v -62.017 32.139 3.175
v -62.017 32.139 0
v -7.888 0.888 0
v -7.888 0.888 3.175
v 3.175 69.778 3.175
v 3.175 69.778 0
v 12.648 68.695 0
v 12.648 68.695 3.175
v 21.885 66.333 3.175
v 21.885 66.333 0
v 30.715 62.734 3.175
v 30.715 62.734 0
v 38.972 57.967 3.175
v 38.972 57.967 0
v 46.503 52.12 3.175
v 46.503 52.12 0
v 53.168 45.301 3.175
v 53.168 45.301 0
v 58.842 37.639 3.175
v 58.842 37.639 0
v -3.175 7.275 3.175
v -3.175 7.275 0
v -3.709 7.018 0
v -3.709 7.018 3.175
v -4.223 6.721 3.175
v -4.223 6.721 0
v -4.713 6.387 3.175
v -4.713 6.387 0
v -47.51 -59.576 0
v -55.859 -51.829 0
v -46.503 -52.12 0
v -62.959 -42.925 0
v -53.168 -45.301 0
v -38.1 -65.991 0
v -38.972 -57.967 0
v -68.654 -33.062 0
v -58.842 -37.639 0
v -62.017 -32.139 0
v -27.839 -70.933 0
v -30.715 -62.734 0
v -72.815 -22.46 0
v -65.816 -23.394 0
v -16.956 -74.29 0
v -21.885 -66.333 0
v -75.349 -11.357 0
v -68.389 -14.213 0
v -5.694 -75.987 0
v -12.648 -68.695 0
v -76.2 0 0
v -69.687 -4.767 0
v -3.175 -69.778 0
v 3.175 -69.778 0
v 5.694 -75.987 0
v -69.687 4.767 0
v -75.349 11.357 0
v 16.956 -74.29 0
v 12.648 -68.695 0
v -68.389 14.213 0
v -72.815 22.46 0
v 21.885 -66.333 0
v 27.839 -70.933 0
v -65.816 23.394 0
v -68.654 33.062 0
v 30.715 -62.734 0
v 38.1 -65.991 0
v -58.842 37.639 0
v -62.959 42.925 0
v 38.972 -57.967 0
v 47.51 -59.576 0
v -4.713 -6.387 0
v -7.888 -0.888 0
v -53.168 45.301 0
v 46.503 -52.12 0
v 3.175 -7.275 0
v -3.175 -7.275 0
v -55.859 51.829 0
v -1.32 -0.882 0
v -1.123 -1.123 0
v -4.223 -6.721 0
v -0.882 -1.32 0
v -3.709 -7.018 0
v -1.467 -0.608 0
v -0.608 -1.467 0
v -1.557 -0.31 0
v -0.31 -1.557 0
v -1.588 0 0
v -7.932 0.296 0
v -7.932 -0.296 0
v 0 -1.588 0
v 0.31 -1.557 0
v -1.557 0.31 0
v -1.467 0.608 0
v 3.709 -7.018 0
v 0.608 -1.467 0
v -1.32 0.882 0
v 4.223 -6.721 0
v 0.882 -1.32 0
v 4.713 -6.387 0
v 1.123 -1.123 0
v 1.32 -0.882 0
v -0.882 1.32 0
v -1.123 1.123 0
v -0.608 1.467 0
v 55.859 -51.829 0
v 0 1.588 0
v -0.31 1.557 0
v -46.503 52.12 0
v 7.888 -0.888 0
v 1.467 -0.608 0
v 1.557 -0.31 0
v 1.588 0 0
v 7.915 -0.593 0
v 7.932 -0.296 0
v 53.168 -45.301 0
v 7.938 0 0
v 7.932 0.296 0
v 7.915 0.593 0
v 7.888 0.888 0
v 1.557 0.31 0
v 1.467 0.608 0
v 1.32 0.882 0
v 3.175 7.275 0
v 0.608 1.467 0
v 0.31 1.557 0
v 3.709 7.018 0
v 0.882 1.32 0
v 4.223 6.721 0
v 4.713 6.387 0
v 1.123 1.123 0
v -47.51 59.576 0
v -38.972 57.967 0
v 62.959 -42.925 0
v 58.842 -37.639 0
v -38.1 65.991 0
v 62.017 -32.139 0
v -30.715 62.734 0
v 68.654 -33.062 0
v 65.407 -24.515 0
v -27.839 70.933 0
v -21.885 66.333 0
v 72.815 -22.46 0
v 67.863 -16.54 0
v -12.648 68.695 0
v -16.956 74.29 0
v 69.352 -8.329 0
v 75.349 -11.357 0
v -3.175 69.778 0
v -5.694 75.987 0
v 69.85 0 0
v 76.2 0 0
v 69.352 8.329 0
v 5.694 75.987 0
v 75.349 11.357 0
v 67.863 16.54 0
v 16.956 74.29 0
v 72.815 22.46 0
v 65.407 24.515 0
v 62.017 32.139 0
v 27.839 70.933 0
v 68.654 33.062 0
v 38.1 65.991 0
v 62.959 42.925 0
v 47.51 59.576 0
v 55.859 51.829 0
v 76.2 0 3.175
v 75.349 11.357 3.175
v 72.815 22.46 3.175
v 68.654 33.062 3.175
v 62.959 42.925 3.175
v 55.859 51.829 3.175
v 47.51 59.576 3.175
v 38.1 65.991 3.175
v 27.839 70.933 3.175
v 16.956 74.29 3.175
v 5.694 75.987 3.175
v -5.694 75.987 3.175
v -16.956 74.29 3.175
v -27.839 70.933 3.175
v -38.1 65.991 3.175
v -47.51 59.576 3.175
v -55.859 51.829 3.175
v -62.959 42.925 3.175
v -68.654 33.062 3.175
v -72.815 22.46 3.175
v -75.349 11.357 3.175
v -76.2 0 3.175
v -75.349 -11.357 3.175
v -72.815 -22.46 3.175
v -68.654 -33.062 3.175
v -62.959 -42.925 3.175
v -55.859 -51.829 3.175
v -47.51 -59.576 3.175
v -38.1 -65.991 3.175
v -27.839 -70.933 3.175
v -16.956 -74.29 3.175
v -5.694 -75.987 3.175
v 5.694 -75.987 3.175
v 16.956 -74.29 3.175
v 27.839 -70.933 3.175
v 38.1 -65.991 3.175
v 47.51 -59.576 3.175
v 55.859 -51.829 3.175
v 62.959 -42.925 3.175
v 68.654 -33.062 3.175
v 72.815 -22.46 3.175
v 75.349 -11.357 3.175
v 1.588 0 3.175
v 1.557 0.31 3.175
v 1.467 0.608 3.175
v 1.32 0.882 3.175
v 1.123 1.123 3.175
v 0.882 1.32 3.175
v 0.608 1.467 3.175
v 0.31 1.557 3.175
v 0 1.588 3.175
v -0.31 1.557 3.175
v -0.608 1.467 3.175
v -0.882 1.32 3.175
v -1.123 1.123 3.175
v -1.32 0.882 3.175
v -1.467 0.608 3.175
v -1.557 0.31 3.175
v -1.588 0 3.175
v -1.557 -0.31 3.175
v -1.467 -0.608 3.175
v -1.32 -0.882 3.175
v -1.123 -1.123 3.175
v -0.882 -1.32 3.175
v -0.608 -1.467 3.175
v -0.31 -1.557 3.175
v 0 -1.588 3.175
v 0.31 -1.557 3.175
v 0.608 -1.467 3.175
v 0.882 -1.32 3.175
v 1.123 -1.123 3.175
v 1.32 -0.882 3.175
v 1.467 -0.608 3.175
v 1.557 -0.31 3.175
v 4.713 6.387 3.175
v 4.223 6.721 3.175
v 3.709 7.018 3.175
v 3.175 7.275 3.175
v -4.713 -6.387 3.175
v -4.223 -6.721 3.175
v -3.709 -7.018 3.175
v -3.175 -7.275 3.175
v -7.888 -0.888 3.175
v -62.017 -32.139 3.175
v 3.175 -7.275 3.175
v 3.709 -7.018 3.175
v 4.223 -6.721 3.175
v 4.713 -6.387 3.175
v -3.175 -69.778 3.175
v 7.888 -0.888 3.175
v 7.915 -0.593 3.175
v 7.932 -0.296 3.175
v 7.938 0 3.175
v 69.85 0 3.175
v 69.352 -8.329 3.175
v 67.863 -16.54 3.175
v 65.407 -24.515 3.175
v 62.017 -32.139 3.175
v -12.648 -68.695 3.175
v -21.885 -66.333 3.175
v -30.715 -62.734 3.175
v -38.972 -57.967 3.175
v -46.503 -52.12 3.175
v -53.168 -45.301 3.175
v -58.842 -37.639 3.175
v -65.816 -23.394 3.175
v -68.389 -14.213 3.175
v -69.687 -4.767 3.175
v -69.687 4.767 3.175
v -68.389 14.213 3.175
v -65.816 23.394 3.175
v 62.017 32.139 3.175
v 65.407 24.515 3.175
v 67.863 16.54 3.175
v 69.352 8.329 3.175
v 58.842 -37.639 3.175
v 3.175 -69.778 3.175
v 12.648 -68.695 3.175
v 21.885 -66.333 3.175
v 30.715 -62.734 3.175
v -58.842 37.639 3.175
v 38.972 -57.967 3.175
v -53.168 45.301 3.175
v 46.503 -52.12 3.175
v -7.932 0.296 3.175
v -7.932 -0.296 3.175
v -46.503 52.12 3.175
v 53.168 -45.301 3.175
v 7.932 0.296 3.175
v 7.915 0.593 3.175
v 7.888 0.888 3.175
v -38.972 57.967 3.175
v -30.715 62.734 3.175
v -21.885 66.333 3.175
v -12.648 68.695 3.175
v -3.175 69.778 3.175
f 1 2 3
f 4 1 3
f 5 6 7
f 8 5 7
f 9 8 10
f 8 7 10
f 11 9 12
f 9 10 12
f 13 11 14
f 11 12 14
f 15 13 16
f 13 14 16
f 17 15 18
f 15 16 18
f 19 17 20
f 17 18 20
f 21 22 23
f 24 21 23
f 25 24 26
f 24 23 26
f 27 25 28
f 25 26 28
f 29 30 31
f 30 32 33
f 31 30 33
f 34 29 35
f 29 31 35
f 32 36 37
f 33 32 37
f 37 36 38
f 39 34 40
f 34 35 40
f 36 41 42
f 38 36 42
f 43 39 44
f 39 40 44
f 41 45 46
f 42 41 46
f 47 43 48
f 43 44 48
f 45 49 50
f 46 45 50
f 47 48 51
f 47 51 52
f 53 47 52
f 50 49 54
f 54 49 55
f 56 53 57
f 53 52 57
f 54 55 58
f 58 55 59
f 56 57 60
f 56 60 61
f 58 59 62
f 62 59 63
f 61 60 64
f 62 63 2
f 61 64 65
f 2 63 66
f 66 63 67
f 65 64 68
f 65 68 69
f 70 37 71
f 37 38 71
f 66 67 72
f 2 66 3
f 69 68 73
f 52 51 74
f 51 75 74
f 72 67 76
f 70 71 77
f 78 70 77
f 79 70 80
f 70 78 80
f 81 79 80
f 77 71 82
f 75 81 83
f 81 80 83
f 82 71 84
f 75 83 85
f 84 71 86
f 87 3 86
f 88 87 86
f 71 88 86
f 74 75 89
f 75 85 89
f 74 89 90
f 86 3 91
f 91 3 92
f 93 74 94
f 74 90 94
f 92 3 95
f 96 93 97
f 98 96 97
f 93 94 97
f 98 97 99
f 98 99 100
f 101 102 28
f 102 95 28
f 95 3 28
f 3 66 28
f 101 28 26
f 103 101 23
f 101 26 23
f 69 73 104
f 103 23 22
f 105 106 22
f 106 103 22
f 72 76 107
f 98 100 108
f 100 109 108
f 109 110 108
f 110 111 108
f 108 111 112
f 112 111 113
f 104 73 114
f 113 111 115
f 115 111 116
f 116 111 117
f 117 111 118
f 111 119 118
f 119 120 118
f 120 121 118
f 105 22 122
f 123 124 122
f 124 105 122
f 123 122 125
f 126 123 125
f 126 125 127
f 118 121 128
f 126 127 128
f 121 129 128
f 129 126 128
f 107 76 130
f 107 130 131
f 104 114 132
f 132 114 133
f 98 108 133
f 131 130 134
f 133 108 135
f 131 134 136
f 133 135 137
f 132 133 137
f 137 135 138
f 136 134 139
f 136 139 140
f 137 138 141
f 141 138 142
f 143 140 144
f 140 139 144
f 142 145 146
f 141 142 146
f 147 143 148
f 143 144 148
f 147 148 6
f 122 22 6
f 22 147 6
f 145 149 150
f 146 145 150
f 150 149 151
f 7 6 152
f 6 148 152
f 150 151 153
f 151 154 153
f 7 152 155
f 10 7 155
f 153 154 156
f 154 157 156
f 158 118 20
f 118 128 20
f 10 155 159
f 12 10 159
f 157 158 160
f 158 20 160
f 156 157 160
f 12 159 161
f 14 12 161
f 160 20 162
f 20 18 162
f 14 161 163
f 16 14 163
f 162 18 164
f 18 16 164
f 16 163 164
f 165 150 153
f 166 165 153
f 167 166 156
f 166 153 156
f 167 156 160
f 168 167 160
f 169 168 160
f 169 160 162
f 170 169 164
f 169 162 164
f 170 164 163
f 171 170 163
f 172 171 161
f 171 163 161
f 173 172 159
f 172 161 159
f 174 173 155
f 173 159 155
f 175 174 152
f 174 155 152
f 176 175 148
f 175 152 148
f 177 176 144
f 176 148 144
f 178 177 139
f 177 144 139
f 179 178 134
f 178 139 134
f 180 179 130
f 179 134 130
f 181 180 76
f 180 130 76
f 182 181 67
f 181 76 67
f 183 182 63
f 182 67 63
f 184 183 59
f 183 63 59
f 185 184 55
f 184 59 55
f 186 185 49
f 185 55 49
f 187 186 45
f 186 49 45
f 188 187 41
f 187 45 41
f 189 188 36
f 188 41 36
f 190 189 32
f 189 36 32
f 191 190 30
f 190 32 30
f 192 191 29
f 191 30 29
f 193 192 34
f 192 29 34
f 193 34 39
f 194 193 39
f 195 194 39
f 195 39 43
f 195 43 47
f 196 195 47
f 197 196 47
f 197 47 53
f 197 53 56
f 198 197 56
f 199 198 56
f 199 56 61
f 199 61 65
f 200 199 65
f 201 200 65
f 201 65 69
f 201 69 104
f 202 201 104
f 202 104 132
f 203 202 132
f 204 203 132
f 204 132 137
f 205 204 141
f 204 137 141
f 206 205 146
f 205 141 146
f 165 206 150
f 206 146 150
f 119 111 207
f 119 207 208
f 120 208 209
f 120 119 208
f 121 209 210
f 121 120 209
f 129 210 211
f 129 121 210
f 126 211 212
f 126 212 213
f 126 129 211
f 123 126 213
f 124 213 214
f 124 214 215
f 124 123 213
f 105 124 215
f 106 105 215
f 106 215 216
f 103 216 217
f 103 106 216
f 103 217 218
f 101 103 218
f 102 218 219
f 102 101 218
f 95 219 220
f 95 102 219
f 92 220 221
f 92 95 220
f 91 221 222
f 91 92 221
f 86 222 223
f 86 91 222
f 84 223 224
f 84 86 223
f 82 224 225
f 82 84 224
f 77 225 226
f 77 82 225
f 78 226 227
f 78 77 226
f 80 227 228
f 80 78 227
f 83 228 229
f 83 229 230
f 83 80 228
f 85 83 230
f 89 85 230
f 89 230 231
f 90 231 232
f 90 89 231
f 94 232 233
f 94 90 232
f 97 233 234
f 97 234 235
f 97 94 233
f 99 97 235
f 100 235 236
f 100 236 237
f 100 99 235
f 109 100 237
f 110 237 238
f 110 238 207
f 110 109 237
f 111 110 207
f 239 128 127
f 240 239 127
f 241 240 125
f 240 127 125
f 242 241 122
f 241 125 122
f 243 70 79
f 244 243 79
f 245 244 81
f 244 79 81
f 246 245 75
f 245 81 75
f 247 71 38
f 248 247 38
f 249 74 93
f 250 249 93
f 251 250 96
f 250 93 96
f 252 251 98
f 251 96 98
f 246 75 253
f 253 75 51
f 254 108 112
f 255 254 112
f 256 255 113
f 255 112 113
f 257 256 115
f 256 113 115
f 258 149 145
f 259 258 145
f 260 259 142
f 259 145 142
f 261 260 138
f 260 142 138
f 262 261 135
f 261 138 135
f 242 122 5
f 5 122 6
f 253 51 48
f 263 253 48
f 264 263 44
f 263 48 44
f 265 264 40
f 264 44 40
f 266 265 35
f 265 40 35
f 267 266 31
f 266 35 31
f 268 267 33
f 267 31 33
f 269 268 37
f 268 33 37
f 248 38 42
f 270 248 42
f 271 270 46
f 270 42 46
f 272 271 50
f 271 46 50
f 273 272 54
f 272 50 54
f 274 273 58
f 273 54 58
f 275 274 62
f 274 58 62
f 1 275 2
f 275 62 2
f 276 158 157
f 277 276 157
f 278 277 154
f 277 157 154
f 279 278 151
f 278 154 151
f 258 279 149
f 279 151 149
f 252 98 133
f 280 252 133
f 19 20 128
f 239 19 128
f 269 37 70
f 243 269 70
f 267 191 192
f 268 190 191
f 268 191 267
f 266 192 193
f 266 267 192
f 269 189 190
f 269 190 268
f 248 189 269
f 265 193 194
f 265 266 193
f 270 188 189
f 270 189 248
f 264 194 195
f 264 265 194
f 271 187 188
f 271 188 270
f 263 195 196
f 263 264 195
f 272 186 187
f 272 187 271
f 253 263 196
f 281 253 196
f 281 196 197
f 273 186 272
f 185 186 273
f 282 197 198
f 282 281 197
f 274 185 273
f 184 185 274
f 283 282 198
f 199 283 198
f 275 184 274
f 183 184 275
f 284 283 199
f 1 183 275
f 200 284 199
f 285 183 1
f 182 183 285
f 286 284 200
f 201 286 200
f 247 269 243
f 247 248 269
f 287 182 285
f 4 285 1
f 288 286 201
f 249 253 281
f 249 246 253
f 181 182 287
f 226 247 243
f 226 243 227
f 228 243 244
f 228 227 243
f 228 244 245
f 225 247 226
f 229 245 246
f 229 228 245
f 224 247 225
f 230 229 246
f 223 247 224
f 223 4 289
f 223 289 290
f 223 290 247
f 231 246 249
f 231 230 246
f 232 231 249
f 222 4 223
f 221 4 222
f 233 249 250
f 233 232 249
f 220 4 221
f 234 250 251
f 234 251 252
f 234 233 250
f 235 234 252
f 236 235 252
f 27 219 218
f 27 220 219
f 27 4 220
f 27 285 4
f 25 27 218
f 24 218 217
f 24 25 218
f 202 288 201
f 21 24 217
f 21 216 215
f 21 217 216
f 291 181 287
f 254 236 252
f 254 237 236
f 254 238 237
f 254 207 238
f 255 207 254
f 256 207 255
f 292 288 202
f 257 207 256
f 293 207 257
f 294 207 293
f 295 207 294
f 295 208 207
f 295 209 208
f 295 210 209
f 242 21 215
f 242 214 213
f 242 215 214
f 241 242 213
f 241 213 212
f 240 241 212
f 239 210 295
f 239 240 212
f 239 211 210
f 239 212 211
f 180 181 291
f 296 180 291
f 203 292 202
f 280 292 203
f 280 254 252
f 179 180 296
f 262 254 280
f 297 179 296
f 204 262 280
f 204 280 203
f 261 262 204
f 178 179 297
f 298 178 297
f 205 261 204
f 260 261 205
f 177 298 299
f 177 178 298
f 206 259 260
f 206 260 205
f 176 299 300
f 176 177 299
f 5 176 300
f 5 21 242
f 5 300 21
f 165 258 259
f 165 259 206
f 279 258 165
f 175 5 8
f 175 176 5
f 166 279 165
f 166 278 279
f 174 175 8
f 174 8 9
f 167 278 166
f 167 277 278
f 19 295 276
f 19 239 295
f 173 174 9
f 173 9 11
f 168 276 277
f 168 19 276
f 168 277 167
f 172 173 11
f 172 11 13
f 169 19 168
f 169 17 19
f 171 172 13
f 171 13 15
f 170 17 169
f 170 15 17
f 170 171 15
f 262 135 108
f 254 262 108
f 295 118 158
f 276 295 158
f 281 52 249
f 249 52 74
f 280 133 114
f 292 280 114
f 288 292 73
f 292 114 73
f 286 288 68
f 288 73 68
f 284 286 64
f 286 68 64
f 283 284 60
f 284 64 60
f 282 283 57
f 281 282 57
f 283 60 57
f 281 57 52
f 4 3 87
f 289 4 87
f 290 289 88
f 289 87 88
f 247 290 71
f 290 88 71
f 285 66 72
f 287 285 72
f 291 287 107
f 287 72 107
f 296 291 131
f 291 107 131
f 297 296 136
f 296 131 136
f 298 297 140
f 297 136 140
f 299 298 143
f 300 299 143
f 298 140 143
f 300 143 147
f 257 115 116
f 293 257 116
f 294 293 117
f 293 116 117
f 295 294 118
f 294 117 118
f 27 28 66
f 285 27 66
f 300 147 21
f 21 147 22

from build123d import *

# Parameters (mm, degrees)
F0_R     = 76.2
F0_R_2   = 1.5875
F1_DEPTH = 3.175


with BuildPart() as f1:
    # F0 (on Top) → F1 (new body)
    with BuildSketch(Plane.XY):
        Circle(F0_R)
        with BuildLine():
            ThreePointArc((62.016851, 32.139271), (67.863464, 16.540035), (69.85, 0))
            ThreePointArc((69.85, 0), (67.863464, -16.540035), (62.016851, -32.139271))
            ThreePointArc((62.016851, -32.139271), (60.491874, -34.925), (58.841851, -37.638532))
            ThreePointArc((58.841851, -37.638532), (34.925, -60.491874), (3.175, -69.777804))
            ThreePointArc((3.175, -69.777804), (0, -69.85), (-3.175, -69.777804))
            ThreePointArc((-3.175, -69.777804), (-34.925, -60.491874), (-58.841851, -37.638532))
            ThreePointArc((-58.841851, -37.638532), (-60.491874, -34.925), (-62.016851, -32.139271))
            ThreePointArc((-62.016851, -32.139271), (-69.85, 0), (-62.016851, 32.139271))
            ThreePointArc((-62.016851, 32.139271), (-60.491874, 34.925), (-58.841851, 37.638532))
            ThreePointArc((-58.841851, 37.638532), (-34.925, 60.491874), (-3.175, 69.777804))
            ThreePointArc((-3.175, 69.777804), (0, 69.85), (3.175, 69.777804))
            ThreePointArc((3.175, 69.777804), (34.925, 60.491874), (58.841851, 37.638532))
            ThreePointArc((58.841851, 37.638532), (60.491874, 34.925), (62.016851, 32.139271))
        make_face(mode=Mode.SUBTRACT)
        with BuildLine():
            Line((-4.712695, 6.38705), (-58.841851, 37.638532))
            ThreePointArc((-58.841851, 37.638532), (-60.491874, 34.925), (-62.016851, 32.139271))
            Line((-62.016851, 32.139271), (-7.887695, 0.887789))
            ThreePointArc((-7.887695, 0.887789), (-6.874077, 3.96875), (-4.712695, 6.38705))
        make_face()
        with BuildLine():
            ThreePointArc((-62.016851, -32.139271), (-60.491874, -34.925), (-58.841851, -37.638532))
            Line((-58.841851, -37.638532), (-4.712695, -6.38705))
            ThreePointArc((-4.712695, -6.38705), (-6.874077, -3.96875), (-7.887695, -0.887789))
            Line((-7.887695, -0.887789), (-62.016851, -32.139271))
        make_face()
        with BuildLine():
            ThreePointArc((7.9375, 0), (7.925039, 0.444592), (7.887695, 0.887789))
            ThreePointArc((7.887695, 0.887789), (6.874077, 3.96875), (4.712695, 6.38705))
            ThreePointArc((4.712695, 6.38705), (3.96875, 6.874077), (3.175, 7.274839))
            Line((3.175, 7.274839), (-3.175, 7.274839))
            ThreePointArc((-3.175, 7.274839), (-3.96875, 6.874077), (-4.712695, 6.38705))
            ThreePointArc((-4.712695, 6.38705), (-6.874077, 3.96875), (-7.887695, 0.887789))
            ThreePointArc((-7.887695, 0.887789), (-7.9375, 0), (-7.887695, -0.887789))
            ThreePointArc((-7.887695, -0.887789), (-6.874077, -3.96875), (-4.712695, -6.38705))
            ThreePointArc((-4.712695, -6.38705), (-3.96875, -6.874077), (-3.175, -7.274839))
            ThreePointArc((-3.175, -7.274839), (0, -7.9375), (3.175, -7.274839))
            ThreePointArc((3.175, -7.274839), (3.96875, -6.874077), (4.712695, -6.38705))
            ThreePointArc((4.712695, -6.38705), (6.874077, -3.96875), (7.887695, -0.887789))
            ThreePointArc((7.887695, -0.887789), (7.925039, -0.444592), (7.9375, 0))
        make_face()
        Circle(F0_R_2, mode=Mode.SUBTRACT)
        with BuildLine():
            ThreePointArc((-3.175, -69.777804), (0, -69.85), (3.175, -69.777804))
            Line((3.175, -69.777804), (3.175, -7.274839))
            ThreePointArc((3.175, -7.274839), (0, -7.9375), (-3.175, -7.274839))
            Line((-3.175, -7.274839), (-3.175, -69.777804))
        make_face()
        with BuildLine():
            ThreePointArc((58.841851, -37.638532), (60.491874, -34.925), (62.016851, -32.139271))
            Line((62.016851, -32.139271), (7.887695, -0.887789))
            ThreePointArc((7.887695, -0.887789), (6.874077, -3.96875), (4.712695, -6.38705))
            Line((4.712695, -6.38705), (58.841851, -37.638532))
        make_face()
        with BuildLine():
            Line((7.887695, 0.887789), (62.016851, 32.139271))
            ThreePointArc((62.016851, 32.139271), (60.491874, 34.925), (58.841851, 37.638532))
            Line((58.841851, 37.638532), (4.712695, 6.38705))
            ThreePointArc((4.712695, 6.38705), (6.874077, 3.96875), (7.887695, 0.887789))
        make_face()
        with BuildLine():
            Line((3.175, 7.274839), (3.175, 69.777804))
            ThreePointArc((3.175, 69.777804), (0, 69.85), (-3.175, 69.777804))
            Line((-3.175, 69.777804), (-3.175, 7.274839))
            ThreePointArc((-3.175, 7.274839), (0, 7.9375), (3.175, 7.274839))
        make_face()
        with BuildLine():
            Line((-3.175, 7.274839), (3.175, 7.274839))
            ThreePointArc((3.175, 7.274839), (0, 7.9375), (-3.175, 7.274839))
        make_face()
    extrude(amount=F1_DEPTH)


solid = f1.part
